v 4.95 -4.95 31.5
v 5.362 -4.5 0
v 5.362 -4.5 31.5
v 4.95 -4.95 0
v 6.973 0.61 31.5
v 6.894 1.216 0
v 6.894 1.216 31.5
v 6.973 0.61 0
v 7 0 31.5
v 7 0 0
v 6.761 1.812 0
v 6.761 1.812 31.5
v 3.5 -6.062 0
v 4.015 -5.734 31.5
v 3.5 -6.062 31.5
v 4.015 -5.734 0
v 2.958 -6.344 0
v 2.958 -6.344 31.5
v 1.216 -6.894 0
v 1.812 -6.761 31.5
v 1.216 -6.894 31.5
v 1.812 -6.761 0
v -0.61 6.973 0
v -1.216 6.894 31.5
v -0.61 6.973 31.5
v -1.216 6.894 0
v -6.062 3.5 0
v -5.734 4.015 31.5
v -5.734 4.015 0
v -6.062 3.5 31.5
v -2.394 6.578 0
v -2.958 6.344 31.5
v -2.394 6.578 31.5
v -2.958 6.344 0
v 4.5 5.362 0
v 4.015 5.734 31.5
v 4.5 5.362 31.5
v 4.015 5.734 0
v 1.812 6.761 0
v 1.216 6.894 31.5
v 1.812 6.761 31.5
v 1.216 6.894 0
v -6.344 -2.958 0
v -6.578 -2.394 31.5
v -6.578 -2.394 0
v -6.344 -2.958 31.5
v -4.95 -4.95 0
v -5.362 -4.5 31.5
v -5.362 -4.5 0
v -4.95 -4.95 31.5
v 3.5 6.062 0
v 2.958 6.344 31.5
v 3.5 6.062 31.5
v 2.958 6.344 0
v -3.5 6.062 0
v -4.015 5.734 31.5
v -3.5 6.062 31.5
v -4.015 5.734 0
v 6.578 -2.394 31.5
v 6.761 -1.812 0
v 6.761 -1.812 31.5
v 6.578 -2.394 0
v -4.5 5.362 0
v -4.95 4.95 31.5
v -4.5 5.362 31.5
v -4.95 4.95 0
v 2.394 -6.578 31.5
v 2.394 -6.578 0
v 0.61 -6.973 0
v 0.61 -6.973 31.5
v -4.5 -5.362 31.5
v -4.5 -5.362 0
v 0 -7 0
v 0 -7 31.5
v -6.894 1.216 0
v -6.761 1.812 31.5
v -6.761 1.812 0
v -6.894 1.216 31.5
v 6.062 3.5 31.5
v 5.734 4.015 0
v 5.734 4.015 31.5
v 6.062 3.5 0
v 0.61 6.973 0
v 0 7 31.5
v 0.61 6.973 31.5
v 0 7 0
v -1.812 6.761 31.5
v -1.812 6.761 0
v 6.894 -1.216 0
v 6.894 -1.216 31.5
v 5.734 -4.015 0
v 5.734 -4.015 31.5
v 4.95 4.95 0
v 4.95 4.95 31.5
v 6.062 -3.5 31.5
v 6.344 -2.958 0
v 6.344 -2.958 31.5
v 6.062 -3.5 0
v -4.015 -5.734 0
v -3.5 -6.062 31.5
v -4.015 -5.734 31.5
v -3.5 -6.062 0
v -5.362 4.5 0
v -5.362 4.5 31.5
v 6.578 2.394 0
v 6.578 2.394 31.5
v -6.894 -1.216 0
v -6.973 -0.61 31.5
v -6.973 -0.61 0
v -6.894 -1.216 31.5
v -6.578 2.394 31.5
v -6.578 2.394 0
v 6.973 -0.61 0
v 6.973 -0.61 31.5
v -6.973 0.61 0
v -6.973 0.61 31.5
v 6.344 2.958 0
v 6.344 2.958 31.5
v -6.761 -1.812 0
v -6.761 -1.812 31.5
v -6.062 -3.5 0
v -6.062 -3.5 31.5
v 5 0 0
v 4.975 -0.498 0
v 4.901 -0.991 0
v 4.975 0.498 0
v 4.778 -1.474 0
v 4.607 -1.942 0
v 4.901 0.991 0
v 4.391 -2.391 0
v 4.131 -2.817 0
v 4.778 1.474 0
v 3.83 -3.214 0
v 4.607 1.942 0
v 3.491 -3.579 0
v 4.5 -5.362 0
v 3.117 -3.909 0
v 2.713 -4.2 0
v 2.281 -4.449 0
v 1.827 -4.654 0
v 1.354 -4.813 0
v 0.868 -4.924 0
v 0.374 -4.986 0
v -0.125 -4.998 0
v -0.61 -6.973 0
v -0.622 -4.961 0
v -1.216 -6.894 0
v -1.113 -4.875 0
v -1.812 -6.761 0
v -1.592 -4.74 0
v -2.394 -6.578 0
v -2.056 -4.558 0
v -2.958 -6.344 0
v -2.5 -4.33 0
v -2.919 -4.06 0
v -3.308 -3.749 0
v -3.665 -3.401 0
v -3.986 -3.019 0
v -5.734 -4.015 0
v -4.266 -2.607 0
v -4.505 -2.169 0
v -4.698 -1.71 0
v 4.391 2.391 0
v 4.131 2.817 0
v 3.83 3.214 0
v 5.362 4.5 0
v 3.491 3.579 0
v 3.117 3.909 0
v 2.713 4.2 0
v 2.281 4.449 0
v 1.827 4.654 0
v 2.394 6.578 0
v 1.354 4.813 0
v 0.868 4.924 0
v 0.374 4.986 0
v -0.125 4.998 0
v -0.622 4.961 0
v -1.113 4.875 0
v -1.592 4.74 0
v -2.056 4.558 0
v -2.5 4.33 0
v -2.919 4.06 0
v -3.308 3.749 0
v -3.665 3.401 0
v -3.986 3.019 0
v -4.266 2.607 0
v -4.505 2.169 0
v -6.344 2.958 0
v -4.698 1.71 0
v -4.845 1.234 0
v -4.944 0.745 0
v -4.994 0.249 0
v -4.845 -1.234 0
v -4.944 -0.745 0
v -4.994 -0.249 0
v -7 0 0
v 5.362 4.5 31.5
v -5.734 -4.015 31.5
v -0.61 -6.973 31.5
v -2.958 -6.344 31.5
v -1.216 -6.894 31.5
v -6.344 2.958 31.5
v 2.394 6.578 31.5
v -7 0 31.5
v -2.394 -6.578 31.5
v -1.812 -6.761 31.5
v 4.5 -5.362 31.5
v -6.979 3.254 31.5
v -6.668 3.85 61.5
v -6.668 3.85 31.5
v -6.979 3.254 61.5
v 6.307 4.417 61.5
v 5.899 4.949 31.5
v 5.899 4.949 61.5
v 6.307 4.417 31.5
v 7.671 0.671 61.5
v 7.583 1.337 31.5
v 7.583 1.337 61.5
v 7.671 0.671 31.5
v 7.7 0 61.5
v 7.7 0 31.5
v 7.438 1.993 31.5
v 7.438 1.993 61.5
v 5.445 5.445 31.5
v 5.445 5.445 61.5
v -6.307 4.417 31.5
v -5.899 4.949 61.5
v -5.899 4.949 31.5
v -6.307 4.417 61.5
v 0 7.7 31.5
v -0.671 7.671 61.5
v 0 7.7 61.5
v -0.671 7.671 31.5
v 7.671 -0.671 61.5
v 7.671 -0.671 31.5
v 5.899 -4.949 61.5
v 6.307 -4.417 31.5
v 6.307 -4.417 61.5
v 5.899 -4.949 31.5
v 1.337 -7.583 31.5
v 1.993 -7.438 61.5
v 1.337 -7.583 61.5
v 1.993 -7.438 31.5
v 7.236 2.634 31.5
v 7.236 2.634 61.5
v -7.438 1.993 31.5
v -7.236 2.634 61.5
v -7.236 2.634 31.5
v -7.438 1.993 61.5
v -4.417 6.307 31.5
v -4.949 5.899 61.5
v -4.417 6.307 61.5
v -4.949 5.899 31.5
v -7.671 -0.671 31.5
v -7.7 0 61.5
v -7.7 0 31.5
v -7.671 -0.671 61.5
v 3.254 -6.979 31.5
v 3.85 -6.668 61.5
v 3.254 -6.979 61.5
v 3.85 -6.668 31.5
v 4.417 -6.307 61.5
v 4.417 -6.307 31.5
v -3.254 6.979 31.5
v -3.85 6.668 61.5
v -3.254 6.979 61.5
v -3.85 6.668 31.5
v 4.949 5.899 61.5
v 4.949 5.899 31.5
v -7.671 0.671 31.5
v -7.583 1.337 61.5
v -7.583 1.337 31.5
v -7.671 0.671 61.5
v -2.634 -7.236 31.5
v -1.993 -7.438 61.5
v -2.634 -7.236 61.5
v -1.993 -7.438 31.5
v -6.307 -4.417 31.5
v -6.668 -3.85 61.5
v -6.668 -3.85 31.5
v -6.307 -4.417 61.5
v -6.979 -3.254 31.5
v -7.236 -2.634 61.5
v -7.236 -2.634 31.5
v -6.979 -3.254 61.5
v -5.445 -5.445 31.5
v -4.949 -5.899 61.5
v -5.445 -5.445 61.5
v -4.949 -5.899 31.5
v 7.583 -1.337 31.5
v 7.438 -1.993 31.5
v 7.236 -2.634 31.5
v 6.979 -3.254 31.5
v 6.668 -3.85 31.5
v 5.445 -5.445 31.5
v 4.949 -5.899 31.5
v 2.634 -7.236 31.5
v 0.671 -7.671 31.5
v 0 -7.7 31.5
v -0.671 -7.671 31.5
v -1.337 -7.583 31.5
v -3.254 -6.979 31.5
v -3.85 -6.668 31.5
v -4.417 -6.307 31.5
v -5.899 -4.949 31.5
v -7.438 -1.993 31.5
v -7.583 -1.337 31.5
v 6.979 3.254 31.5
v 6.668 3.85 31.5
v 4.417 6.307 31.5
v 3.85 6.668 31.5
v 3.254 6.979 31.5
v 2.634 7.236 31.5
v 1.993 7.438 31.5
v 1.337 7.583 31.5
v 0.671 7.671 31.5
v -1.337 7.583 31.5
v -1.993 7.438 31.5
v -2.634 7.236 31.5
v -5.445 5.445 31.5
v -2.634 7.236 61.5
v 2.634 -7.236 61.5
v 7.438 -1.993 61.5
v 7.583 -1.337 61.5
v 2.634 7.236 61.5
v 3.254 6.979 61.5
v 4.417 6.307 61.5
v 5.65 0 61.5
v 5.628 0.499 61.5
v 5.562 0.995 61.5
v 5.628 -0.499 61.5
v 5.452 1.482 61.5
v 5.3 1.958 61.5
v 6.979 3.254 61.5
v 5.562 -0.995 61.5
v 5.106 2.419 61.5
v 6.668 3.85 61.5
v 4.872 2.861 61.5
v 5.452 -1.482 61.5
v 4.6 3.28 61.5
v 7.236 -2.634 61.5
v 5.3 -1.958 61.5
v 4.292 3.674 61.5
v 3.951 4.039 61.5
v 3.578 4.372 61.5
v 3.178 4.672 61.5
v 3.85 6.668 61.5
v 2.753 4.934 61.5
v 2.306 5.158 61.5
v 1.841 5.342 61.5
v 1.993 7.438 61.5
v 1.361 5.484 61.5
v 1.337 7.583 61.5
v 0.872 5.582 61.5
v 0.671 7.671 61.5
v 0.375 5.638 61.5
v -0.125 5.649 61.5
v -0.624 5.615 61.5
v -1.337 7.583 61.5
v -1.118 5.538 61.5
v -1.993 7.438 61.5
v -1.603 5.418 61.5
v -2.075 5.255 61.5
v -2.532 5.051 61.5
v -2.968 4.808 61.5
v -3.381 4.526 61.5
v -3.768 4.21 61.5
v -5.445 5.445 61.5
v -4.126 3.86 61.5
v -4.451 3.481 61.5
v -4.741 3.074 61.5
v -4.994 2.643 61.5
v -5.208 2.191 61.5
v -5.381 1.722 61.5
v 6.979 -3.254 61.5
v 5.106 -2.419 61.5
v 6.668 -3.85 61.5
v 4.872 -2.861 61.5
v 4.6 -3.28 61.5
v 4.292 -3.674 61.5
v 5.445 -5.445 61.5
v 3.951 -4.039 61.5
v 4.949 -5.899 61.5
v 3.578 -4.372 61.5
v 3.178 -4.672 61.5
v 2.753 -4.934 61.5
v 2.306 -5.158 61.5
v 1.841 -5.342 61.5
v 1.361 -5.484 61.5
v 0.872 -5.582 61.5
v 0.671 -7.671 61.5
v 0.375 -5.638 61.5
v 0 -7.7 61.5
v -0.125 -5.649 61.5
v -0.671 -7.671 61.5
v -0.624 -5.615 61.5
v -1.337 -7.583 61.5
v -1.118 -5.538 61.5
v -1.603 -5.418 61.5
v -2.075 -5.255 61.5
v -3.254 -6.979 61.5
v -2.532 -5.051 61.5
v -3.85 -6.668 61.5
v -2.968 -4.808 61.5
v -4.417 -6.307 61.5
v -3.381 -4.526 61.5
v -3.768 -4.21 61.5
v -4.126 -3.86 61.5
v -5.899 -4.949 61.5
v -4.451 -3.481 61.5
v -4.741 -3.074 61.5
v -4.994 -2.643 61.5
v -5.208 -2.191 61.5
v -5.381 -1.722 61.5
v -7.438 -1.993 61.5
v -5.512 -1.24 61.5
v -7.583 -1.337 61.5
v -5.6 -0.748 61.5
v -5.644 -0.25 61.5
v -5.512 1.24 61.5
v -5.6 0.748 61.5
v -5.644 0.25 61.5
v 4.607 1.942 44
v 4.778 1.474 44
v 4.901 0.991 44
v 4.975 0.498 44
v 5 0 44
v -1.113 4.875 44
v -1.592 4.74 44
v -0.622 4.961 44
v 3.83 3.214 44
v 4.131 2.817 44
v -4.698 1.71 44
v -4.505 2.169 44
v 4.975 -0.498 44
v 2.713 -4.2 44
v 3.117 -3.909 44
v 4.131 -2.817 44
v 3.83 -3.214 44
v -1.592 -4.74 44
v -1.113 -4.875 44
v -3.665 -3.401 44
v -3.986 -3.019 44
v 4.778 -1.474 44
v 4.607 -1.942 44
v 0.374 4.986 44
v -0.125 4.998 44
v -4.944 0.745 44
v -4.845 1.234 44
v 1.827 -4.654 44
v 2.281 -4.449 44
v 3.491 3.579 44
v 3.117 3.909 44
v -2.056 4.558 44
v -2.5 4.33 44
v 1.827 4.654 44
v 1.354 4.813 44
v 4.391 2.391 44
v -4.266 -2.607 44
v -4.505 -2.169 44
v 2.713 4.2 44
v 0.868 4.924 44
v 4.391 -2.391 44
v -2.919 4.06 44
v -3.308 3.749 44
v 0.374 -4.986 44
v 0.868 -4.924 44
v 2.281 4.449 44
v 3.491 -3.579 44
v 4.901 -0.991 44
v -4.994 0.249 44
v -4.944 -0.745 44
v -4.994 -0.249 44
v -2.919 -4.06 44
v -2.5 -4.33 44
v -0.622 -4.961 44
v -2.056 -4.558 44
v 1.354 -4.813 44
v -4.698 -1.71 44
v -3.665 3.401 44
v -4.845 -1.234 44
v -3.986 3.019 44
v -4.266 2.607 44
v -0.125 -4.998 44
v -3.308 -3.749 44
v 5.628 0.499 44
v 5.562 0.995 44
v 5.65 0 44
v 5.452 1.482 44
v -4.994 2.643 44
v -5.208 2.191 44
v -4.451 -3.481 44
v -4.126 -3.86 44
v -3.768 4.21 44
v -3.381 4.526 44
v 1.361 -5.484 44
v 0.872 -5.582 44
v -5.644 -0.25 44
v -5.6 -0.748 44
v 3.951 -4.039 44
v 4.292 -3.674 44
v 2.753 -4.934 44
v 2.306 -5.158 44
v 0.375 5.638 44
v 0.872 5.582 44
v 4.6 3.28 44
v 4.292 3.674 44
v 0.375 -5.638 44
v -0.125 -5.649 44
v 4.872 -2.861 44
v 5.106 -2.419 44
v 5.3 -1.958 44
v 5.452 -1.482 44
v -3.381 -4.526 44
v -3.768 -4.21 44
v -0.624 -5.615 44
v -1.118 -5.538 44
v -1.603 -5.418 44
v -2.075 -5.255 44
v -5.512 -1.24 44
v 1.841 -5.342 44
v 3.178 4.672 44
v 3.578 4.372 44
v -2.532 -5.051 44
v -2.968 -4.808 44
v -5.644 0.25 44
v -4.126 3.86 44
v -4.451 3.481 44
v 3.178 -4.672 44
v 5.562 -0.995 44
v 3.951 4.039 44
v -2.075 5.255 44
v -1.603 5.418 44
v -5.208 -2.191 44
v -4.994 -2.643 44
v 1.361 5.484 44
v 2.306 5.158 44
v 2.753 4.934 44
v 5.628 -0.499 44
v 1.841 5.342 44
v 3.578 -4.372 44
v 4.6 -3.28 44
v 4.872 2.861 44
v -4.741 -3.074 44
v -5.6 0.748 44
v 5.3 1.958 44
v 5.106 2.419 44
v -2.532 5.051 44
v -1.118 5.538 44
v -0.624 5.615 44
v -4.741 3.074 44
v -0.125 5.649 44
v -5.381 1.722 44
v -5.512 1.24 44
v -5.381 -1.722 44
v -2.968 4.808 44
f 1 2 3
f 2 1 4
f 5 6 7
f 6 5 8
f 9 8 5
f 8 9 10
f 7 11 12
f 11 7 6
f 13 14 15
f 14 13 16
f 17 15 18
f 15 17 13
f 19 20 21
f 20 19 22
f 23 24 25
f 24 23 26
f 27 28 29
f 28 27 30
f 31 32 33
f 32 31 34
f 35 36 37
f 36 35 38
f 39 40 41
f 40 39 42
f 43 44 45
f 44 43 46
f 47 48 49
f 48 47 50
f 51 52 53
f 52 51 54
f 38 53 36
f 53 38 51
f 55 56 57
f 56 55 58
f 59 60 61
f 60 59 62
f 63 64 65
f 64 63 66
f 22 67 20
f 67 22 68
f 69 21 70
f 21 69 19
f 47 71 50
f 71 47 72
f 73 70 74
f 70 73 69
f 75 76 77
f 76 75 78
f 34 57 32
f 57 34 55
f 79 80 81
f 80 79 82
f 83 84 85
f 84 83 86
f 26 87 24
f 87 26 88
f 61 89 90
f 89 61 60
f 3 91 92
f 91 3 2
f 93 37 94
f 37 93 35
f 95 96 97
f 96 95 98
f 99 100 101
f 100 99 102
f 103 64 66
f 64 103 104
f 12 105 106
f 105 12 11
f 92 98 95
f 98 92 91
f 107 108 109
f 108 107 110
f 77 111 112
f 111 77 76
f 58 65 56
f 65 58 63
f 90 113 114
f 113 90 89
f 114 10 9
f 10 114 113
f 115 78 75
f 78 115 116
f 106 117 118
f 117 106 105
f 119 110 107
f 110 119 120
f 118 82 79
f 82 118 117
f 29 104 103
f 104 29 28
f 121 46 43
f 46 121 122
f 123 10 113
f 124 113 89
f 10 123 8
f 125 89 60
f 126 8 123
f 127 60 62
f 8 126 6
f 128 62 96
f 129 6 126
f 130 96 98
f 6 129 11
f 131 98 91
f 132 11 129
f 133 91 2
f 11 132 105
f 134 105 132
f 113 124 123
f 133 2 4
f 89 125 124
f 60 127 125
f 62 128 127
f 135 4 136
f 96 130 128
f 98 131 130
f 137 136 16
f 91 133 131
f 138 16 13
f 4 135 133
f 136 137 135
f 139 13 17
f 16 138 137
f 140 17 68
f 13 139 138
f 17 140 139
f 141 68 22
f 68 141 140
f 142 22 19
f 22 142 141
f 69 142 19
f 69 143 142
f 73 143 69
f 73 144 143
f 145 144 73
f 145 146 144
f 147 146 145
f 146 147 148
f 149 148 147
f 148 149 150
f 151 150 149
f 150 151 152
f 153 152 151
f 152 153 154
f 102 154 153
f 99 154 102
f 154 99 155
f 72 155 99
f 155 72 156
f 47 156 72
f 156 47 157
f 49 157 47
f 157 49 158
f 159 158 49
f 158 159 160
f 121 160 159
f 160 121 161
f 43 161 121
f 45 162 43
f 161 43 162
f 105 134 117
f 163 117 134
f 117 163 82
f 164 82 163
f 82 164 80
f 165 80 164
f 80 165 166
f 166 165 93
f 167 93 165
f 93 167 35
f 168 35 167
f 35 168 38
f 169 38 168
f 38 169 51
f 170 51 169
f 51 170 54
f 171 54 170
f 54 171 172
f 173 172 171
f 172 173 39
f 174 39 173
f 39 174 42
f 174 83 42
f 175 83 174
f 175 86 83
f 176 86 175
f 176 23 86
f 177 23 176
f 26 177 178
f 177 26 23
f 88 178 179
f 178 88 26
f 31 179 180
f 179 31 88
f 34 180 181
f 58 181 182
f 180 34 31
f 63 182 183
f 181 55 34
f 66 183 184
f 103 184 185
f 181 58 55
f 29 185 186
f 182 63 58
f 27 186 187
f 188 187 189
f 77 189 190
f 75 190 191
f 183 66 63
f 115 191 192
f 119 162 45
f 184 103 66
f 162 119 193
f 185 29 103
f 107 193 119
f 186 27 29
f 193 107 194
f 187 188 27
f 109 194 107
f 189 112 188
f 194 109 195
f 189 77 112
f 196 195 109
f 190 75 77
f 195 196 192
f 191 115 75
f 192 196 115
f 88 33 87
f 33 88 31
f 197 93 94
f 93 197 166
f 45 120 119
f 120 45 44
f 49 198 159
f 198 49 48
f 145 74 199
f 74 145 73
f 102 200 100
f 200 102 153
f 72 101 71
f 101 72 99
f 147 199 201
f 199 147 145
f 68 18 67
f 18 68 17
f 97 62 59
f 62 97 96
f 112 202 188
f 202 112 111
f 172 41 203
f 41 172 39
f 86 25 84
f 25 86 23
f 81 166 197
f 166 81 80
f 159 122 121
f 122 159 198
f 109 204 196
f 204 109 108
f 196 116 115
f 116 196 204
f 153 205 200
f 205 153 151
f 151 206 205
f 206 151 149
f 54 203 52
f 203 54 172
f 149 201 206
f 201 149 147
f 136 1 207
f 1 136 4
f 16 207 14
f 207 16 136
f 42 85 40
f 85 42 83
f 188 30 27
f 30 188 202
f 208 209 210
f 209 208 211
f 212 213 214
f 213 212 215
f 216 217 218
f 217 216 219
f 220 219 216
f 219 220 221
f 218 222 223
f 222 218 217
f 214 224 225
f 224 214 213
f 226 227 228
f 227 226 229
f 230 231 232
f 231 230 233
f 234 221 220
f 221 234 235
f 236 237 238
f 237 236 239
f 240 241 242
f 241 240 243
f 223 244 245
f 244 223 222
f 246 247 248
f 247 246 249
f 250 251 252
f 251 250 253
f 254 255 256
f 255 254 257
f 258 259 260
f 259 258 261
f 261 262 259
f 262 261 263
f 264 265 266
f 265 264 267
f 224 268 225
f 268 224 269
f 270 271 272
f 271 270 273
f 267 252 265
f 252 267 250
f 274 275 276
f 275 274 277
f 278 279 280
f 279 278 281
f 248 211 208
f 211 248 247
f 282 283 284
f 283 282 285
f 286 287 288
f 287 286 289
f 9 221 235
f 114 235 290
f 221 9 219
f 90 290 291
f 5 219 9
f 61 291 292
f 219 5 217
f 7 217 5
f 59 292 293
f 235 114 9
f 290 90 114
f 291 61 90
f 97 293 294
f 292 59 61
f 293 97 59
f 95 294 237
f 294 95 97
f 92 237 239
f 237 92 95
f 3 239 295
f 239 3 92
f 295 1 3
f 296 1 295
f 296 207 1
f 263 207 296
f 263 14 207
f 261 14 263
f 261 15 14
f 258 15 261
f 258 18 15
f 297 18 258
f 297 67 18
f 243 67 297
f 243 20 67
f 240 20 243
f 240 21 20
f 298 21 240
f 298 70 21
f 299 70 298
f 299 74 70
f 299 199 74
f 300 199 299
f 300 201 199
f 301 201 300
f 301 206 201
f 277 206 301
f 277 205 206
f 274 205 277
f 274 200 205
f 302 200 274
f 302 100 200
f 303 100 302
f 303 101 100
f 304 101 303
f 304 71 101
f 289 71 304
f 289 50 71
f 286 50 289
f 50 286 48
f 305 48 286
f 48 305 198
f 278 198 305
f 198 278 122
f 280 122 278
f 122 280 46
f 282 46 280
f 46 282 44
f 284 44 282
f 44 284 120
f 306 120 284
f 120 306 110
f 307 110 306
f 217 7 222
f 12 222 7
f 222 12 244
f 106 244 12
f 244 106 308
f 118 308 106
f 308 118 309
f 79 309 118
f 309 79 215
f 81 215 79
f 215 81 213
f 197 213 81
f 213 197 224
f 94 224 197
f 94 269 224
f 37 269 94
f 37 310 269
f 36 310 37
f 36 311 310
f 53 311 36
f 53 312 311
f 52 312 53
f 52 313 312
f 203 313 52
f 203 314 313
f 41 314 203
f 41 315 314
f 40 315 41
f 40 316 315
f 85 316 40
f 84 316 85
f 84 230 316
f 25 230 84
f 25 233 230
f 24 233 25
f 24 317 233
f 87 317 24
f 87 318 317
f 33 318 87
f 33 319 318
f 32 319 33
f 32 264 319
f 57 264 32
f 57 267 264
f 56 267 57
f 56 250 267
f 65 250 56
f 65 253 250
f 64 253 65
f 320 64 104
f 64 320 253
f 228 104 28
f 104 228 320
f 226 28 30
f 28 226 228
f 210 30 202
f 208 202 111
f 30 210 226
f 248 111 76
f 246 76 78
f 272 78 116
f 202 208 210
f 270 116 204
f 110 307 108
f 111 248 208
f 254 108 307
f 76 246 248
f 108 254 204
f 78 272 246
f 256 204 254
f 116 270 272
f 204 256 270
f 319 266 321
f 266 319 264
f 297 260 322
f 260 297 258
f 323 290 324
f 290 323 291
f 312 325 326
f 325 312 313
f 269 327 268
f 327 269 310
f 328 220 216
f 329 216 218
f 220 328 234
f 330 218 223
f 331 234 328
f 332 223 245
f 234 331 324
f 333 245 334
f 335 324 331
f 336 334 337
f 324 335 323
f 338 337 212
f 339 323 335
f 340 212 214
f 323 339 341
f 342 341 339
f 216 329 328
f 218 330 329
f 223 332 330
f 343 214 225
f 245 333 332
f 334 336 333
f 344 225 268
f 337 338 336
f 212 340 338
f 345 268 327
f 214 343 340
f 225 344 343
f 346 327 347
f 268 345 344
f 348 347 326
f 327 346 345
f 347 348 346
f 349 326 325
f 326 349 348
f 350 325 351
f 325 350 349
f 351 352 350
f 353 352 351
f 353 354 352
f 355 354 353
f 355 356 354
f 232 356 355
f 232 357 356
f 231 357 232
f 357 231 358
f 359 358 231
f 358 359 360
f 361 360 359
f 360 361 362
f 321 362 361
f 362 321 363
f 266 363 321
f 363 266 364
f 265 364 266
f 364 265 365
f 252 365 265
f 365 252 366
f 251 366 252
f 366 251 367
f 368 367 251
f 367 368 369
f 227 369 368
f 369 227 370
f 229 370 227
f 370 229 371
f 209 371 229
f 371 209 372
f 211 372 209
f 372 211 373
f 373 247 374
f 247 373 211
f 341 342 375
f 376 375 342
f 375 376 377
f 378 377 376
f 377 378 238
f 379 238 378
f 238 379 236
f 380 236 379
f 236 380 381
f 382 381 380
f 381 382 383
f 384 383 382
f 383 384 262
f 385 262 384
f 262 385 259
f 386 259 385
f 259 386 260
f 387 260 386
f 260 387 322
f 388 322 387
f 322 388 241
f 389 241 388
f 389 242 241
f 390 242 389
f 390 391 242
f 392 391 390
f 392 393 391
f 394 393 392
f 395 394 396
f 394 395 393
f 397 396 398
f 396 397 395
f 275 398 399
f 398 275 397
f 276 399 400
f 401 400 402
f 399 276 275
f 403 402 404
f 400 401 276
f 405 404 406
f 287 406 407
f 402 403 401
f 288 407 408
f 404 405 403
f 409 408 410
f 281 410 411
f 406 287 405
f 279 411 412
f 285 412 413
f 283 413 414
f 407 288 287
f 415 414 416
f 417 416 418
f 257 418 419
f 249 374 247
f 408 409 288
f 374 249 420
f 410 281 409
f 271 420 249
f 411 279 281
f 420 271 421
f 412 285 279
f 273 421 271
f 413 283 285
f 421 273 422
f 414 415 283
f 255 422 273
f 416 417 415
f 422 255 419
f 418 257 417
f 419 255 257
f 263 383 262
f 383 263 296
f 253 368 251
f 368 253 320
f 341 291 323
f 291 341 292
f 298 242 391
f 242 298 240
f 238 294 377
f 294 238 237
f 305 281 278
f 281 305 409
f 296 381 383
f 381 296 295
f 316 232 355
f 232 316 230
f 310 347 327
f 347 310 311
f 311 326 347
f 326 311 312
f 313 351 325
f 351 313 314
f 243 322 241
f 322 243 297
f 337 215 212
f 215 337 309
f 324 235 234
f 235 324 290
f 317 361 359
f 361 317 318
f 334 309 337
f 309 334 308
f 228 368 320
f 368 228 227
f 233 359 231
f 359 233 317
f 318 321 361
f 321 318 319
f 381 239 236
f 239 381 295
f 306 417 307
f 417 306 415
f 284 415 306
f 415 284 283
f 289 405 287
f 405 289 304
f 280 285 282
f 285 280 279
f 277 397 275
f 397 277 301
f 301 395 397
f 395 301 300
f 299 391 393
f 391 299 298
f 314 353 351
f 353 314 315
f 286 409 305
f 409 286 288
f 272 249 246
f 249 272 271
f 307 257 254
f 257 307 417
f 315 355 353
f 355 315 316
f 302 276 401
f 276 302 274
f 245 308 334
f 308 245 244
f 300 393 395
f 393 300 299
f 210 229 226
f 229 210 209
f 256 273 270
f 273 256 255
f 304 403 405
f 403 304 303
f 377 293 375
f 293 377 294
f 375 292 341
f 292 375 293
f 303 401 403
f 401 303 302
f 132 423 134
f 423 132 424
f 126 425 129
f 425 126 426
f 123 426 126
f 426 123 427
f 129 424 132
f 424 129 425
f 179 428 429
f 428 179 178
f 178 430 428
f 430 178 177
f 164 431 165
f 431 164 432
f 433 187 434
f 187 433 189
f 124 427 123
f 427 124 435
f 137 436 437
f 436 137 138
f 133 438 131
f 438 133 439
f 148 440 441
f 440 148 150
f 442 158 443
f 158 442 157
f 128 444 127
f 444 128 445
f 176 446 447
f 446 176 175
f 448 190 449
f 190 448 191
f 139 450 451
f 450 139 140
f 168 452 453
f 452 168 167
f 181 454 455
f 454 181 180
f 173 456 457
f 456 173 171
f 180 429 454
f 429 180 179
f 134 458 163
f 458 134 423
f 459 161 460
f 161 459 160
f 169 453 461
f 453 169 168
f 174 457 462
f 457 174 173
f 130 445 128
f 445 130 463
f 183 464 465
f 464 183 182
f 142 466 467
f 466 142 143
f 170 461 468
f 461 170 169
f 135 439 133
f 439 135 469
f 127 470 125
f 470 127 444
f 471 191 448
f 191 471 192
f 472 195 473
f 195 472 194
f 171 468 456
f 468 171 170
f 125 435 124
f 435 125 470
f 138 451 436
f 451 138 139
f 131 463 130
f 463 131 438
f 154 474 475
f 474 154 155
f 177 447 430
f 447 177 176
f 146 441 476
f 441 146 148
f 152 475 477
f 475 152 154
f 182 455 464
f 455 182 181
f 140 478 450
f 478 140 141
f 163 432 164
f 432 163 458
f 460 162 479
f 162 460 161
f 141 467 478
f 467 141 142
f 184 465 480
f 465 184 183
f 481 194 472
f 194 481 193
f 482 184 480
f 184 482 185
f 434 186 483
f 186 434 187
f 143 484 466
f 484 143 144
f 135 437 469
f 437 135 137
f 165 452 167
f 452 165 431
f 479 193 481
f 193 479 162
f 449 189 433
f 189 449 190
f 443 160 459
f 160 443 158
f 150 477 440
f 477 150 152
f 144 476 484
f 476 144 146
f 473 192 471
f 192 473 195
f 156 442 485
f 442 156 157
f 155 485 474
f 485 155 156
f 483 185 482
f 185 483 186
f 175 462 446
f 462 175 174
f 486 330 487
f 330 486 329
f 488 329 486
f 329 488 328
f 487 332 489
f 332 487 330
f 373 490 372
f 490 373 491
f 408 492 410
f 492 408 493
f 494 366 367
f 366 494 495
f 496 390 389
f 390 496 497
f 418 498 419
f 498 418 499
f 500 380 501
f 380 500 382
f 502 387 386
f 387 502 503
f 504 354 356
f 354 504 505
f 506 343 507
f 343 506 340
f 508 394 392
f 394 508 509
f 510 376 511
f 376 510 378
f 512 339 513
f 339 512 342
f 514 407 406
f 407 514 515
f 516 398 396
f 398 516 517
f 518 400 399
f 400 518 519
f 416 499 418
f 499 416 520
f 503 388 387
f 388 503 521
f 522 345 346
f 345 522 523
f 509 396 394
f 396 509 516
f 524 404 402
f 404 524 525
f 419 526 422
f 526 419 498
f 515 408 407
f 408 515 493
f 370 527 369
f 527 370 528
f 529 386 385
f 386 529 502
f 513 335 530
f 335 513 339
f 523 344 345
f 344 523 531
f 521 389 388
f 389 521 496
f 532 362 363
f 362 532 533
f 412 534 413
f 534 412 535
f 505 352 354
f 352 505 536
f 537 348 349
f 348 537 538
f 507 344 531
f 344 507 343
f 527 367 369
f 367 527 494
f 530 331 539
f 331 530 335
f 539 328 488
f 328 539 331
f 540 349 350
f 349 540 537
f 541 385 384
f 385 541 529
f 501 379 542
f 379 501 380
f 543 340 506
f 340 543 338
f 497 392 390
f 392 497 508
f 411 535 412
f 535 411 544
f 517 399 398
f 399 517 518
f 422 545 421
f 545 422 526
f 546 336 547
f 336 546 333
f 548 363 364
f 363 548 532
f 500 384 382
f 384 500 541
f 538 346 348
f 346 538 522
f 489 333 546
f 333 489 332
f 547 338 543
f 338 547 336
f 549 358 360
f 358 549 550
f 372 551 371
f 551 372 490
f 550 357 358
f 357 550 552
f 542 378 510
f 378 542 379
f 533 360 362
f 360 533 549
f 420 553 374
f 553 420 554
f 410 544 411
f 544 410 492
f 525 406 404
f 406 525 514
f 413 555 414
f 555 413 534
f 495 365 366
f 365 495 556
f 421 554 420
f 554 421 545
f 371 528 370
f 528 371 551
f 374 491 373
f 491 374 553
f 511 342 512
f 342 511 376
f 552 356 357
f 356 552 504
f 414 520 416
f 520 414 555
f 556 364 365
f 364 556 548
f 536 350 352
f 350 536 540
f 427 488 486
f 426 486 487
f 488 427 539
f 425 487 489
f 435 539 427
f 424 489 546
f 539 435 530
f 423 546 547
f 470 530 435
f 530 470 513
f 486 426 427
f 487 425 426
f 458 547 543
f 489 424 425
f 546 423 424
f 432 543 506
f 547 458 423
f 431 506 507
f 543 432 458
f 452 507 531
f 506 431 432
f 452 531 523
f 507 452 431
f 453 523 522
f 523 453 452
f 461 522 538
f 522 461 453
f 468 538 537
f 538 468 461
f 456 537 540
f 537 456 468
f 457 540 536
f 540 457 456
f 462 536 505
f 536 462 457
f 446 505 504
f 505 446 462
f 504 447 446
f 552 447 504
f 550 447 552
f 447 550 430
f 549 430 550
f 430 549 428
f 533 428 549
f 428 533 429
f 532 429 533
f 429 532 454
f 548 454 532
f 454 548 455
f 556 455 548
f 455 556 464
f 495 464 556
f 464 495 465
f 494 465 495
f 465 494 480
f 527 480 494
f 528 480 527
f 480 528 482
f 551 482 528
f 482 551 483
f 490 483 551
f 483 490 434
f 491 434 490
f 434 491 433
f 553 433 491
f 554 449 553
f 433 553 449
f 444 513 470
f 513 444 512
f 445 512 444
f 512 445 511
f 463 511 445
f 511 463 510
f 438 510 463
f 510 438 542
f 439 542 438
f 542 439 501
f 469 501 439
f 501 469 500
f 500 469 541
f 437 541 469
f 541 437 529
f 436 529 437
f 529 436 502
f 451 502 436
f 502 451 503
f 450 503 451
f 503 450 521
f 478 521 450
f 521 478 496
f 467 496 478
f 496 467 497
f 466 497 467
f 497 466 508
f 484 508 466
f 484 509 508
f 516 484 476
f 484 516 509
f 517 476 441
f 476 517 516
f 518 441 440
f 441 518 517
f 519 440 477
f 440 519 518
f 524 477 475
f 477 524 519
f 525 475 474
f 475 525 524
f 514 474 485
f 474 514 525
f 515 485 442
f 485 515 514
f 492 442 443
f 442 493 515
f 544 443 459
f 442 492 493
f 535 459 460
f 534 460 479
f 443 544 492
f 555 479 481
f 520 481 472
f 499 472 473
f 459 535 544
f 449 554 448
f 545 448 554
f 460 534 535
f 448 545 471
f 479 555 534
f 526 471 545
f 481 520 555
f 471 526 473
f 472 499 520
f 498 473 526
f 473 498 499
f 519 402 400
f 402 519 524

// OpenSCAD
// Distance from step to tip of Silhouette pen. You shouldn't have to change this.
standard_tip_length = 31.5;

// Diameter of thin section of Silhouette pen, below the step. You shouldn't have to change this.
standard_thin_diameter = 13.9;

// Diameter of thick section of Silhouette pen, above the step. You shouldn't have to change this.
standard_thick_diameter = 15.4;

// Diameter of thin section of pen, below the step.
pen_thin_diameter = 10;

// Diameter of thick section of pen, above the step. Allow a little bit extra for clearance.
pen_thick_diameter = 11.3;

// Length of pen tip, from step to tip.
pen_tip_length = 44;

// Length of holder, to extend above the step. Overall length will be this dimension + pen_tip_length.
holder_length = 30;

/* [Hidden] */
slop = 0.1;
$fa = 5;
$fs = 0.5;

module pen() {
     translate([0, 0, -slop]) cylinder(h=pen_tip_length + 2*slop, d=pen_thin_diameter);
     translate([0, 0, pen_tip_length]) cylinder(h=100, d=pen_thick_diameter);
}

module holder_solid() {
     cylinder(h=standard_tip_length + slop, d=standard_thin_diameter + slop);
     translate([0, 0, standard_tip_length]) cylinder(h=holder_length, d=standard_thick_diameter);
}

difference() {
     holder_solid();
     pen();
}
